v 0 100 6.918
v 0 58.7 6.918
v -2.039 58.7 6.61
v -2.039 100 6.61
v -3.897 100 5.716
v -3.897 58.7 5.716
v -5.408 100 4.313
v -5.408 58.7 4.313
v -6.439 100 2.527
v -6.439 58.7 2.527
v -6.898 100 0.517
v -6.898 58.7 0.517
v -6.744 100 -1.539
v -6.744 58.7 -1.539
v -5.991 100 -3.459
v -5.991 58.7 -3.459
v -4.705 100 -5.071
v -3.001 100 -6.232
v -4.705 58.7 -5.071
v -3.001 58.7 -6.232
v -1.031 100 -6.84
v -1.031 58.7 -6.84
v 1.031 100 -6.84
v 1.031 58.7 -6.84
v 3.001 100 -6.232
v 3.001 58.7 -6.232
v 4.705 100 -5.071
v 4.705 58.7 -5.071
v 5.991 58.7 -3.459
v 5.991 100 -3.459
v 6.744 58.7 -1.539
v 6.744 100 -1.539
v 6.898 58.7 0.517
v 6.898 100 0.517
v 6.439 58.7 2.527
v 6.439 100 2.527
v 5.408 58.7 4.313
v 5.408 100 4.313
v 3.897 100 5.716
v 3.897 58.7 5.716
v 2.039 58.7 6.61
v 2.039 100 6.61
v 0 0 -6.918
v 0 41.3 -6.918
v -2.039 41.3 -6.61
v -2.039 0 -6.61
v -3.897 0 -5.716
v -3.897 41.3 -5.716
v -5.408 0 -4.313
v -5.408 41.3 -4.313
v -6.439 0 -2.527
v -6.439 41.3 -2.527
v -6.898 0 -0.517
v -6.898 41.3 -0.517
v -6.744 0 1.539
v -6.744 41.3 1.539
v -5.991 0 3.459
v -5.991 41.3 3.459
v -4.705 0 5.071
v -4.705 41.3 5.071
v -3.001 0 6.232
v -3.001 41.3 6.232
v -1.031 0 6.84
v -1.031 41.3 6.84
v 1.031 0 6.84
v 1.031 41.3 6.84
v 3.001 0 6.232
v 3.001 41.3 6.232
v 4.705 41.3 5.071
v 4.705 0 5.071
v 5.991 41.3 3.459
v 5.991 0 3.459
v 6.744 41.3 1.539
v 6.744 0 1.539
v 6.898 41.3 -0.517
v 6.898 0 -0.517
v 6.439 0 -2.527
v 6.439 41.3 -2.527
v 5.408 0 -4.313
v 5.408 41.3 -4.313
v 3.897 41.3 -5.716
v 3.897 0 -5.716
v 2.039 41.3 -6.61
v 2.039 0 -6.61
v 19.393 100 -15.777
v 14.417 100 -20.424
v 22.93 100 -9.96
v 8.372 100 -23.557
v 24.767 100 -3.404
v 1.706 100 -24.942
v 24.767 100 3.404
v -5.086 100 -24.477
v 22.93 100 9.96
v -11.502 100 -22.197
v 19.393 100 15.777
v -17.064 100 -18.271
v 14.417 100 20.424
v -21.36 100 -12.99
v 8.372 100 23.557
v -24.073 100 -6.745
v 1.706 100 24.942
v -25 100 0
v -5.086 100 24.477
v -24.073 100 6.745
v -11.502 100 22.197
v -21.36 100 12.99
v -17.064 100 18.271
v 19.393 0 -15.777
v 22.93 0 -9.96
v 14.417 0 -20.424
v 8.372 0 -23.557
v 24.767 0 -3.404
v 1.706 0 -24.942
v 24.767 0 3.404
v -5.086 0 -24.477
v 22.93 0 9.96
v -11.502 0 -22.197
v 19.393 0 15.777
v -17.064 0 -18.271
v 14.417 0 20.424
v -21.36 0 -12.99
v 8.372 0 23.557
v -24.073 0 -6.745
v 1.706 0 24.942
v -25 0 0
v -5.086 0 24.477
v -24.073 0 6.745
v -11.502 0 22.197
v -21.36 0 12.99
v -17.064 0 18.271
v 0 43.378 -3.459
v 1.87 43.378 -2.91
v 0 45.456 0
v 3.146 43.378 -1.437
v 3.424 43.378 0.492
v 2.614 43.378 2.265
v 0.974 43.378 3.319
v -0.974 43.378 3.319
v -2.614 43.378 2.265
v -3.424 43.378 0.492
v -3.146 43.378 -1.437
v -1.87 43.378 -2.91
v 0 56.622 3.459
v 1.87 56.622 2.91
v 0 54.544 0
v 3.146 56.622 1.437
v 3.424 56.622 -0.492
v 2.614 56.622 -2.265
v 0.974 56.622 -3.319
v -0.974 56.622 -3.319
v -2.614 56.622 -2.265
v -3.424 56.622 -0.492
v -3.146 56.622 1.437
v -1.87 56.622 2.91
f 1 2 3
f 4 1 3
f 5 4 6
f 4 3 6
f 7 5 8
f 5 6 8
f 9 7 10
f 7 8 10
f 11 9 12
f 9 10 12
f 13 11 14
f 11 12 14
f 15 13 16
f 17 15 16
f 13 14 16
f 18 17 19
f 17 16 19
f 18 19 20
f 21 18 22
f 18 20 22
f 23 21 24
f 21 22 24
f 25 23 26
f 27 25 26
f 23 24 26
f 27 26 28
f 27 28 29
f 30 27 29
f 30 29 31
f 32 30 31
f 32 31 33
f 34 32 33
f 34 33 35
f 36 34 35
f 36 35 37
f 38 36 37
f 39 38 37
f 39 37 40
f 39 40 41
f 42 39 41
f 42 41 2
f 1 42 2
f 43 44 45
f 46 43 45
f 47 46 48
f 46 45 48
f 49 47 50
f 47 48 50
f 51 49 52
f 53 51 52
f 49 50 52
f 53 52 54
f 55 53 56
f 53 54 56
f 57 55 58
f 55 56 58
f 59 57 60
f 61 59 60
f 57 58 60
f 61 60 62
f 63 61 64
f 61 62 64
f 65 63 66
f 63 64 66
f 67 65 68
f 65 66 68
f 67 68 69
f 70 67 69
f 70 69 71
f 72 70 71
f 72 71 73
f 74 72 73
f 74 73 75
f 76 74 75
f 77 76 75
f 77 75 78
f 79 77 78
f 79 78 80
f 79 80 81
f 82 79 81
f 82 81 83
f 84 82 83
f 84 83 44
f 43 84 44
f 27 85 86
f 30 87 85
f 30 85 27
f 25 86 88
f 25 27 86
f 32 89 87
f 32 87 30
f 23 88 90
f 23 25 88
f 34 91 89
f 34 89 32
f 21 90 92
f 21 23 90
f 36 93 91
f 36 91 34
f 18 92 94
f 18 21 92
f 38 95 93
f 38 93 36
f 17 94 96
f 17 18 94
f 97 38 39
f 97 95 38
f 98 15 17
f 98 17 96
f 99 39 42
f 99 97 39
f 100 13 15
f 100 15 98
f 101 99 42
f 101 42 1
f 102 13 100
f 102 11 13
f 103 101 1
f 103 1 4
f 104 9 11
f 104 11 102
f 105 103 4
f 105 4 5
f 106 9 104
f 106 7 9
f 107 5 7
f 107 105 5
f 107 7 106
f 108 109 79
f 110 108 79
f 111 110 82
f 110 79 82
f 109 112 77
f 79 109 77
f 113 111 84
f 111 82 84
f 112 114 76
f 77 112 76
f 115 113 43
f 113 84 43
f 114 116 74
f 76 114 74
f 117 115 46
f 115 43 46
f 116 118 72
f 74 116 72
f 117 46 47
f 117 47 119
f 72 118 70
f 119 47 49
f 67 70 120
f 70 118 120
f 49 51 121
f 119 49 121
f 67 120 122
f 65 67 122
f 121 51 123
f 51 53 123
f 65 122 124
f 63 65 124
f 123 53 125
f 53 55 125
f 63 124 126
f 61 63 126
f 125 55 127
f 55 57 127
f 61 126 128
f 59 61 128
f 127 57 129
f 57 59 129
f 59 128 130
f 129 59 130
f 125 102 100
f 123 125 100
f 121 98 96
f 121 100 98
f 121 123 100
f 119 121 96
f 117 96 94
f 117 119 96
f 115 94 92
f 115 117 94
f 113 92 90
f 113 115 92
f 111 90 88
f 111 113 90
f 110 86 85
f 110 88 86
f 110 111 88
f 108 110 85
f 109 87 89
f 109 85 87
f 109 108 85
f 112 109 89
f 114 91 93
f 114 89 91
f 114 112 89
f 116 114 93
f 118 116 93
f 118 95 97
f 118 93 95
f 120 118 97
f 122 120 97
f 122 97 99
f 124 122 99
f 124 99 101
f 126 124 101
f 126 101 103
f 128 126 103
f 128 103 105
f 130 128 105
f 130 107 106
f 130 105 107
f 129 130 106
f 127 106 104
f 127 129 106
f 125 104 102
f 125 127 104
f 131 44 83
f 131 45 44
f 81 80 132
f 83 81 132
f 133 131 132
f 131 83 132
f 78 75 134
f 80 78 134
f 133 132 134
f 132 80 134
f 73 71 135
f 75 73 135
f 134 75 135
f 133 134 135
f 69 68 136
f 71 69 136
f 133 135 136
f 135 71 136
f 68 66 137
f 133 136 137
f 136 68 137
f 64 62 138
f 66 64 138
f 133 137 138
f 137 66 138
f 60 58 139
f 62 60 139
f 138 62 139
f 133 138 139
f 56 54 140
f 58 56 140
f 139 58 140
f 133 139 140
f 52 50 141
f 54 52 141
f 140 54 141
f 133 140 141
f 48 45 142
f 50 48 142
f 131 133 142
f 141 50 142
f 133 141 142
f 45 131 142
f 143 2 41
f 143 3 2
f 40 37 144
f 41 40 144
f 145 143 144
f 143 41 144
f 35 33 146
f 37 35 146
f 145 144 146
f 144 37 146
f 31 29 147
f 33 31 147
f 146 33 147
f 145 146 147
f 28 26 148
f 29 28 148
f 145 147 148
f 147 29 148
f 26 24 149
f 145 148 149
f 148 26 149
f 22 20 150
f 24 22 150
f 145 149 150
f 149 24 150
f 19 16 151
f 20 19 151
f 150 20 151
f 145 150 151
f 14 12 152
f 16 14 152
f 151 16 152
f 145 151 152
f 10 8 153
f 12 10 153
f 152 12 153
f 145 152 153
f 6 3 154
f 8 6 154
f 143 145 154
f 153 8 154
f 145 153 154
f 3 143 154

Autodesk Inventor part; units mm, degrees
ref_plane "YZ Plane" through (0, 0, 0) normal (1, 0, 0) x (0, 1, 0)
ref_plane "XZ Plane" through (0, 0, 0) normal (0, 1, 0) x (-1, 0, 0)
ref_plane "XY Plane" through (0, 0, 0) normal (0, 0, 1) x (1, 0, 0)
sketch "Szkic1" plane through (0, 0, 0) normal (0, 1, 0) x (-1, 0, 0)
  circle A0 centre (0, 0) radius 25
extrude "Wyciągnięcie proste1" add sketch "Szkic1" along normal blind 100
sketch "Szkic2" plane through (0, 0, 0) normal (0, -1, 0) x (1, 0, 0)
  circle A0 centre (0, 0) radius 25 projected
hole "Otwór1" at (0, 0, 0) direction (0, 1, 0) diameter 13.835 depth 41.3 tip angle 118 thread size "M16x2" class "6H" standard "ISO Metric profile"
sketch "Szkic3" plane through (0, 100, 0) normal (0, 1, 0) x (1, 0, 0)
  line L0 (0, 0) -> (-13.3904, -21.1115)
  circle A0 centre (0, 0) radius 25 projected
hole "Otwór2" at (0, 100, 0) direction (0, -1, 0) diameter 13.835 depth 41.3 tip angle 118 thread size "M16x2" class "6H" standard "ISO Metric profile"
properties part number "mocowanie_pod_hak"
